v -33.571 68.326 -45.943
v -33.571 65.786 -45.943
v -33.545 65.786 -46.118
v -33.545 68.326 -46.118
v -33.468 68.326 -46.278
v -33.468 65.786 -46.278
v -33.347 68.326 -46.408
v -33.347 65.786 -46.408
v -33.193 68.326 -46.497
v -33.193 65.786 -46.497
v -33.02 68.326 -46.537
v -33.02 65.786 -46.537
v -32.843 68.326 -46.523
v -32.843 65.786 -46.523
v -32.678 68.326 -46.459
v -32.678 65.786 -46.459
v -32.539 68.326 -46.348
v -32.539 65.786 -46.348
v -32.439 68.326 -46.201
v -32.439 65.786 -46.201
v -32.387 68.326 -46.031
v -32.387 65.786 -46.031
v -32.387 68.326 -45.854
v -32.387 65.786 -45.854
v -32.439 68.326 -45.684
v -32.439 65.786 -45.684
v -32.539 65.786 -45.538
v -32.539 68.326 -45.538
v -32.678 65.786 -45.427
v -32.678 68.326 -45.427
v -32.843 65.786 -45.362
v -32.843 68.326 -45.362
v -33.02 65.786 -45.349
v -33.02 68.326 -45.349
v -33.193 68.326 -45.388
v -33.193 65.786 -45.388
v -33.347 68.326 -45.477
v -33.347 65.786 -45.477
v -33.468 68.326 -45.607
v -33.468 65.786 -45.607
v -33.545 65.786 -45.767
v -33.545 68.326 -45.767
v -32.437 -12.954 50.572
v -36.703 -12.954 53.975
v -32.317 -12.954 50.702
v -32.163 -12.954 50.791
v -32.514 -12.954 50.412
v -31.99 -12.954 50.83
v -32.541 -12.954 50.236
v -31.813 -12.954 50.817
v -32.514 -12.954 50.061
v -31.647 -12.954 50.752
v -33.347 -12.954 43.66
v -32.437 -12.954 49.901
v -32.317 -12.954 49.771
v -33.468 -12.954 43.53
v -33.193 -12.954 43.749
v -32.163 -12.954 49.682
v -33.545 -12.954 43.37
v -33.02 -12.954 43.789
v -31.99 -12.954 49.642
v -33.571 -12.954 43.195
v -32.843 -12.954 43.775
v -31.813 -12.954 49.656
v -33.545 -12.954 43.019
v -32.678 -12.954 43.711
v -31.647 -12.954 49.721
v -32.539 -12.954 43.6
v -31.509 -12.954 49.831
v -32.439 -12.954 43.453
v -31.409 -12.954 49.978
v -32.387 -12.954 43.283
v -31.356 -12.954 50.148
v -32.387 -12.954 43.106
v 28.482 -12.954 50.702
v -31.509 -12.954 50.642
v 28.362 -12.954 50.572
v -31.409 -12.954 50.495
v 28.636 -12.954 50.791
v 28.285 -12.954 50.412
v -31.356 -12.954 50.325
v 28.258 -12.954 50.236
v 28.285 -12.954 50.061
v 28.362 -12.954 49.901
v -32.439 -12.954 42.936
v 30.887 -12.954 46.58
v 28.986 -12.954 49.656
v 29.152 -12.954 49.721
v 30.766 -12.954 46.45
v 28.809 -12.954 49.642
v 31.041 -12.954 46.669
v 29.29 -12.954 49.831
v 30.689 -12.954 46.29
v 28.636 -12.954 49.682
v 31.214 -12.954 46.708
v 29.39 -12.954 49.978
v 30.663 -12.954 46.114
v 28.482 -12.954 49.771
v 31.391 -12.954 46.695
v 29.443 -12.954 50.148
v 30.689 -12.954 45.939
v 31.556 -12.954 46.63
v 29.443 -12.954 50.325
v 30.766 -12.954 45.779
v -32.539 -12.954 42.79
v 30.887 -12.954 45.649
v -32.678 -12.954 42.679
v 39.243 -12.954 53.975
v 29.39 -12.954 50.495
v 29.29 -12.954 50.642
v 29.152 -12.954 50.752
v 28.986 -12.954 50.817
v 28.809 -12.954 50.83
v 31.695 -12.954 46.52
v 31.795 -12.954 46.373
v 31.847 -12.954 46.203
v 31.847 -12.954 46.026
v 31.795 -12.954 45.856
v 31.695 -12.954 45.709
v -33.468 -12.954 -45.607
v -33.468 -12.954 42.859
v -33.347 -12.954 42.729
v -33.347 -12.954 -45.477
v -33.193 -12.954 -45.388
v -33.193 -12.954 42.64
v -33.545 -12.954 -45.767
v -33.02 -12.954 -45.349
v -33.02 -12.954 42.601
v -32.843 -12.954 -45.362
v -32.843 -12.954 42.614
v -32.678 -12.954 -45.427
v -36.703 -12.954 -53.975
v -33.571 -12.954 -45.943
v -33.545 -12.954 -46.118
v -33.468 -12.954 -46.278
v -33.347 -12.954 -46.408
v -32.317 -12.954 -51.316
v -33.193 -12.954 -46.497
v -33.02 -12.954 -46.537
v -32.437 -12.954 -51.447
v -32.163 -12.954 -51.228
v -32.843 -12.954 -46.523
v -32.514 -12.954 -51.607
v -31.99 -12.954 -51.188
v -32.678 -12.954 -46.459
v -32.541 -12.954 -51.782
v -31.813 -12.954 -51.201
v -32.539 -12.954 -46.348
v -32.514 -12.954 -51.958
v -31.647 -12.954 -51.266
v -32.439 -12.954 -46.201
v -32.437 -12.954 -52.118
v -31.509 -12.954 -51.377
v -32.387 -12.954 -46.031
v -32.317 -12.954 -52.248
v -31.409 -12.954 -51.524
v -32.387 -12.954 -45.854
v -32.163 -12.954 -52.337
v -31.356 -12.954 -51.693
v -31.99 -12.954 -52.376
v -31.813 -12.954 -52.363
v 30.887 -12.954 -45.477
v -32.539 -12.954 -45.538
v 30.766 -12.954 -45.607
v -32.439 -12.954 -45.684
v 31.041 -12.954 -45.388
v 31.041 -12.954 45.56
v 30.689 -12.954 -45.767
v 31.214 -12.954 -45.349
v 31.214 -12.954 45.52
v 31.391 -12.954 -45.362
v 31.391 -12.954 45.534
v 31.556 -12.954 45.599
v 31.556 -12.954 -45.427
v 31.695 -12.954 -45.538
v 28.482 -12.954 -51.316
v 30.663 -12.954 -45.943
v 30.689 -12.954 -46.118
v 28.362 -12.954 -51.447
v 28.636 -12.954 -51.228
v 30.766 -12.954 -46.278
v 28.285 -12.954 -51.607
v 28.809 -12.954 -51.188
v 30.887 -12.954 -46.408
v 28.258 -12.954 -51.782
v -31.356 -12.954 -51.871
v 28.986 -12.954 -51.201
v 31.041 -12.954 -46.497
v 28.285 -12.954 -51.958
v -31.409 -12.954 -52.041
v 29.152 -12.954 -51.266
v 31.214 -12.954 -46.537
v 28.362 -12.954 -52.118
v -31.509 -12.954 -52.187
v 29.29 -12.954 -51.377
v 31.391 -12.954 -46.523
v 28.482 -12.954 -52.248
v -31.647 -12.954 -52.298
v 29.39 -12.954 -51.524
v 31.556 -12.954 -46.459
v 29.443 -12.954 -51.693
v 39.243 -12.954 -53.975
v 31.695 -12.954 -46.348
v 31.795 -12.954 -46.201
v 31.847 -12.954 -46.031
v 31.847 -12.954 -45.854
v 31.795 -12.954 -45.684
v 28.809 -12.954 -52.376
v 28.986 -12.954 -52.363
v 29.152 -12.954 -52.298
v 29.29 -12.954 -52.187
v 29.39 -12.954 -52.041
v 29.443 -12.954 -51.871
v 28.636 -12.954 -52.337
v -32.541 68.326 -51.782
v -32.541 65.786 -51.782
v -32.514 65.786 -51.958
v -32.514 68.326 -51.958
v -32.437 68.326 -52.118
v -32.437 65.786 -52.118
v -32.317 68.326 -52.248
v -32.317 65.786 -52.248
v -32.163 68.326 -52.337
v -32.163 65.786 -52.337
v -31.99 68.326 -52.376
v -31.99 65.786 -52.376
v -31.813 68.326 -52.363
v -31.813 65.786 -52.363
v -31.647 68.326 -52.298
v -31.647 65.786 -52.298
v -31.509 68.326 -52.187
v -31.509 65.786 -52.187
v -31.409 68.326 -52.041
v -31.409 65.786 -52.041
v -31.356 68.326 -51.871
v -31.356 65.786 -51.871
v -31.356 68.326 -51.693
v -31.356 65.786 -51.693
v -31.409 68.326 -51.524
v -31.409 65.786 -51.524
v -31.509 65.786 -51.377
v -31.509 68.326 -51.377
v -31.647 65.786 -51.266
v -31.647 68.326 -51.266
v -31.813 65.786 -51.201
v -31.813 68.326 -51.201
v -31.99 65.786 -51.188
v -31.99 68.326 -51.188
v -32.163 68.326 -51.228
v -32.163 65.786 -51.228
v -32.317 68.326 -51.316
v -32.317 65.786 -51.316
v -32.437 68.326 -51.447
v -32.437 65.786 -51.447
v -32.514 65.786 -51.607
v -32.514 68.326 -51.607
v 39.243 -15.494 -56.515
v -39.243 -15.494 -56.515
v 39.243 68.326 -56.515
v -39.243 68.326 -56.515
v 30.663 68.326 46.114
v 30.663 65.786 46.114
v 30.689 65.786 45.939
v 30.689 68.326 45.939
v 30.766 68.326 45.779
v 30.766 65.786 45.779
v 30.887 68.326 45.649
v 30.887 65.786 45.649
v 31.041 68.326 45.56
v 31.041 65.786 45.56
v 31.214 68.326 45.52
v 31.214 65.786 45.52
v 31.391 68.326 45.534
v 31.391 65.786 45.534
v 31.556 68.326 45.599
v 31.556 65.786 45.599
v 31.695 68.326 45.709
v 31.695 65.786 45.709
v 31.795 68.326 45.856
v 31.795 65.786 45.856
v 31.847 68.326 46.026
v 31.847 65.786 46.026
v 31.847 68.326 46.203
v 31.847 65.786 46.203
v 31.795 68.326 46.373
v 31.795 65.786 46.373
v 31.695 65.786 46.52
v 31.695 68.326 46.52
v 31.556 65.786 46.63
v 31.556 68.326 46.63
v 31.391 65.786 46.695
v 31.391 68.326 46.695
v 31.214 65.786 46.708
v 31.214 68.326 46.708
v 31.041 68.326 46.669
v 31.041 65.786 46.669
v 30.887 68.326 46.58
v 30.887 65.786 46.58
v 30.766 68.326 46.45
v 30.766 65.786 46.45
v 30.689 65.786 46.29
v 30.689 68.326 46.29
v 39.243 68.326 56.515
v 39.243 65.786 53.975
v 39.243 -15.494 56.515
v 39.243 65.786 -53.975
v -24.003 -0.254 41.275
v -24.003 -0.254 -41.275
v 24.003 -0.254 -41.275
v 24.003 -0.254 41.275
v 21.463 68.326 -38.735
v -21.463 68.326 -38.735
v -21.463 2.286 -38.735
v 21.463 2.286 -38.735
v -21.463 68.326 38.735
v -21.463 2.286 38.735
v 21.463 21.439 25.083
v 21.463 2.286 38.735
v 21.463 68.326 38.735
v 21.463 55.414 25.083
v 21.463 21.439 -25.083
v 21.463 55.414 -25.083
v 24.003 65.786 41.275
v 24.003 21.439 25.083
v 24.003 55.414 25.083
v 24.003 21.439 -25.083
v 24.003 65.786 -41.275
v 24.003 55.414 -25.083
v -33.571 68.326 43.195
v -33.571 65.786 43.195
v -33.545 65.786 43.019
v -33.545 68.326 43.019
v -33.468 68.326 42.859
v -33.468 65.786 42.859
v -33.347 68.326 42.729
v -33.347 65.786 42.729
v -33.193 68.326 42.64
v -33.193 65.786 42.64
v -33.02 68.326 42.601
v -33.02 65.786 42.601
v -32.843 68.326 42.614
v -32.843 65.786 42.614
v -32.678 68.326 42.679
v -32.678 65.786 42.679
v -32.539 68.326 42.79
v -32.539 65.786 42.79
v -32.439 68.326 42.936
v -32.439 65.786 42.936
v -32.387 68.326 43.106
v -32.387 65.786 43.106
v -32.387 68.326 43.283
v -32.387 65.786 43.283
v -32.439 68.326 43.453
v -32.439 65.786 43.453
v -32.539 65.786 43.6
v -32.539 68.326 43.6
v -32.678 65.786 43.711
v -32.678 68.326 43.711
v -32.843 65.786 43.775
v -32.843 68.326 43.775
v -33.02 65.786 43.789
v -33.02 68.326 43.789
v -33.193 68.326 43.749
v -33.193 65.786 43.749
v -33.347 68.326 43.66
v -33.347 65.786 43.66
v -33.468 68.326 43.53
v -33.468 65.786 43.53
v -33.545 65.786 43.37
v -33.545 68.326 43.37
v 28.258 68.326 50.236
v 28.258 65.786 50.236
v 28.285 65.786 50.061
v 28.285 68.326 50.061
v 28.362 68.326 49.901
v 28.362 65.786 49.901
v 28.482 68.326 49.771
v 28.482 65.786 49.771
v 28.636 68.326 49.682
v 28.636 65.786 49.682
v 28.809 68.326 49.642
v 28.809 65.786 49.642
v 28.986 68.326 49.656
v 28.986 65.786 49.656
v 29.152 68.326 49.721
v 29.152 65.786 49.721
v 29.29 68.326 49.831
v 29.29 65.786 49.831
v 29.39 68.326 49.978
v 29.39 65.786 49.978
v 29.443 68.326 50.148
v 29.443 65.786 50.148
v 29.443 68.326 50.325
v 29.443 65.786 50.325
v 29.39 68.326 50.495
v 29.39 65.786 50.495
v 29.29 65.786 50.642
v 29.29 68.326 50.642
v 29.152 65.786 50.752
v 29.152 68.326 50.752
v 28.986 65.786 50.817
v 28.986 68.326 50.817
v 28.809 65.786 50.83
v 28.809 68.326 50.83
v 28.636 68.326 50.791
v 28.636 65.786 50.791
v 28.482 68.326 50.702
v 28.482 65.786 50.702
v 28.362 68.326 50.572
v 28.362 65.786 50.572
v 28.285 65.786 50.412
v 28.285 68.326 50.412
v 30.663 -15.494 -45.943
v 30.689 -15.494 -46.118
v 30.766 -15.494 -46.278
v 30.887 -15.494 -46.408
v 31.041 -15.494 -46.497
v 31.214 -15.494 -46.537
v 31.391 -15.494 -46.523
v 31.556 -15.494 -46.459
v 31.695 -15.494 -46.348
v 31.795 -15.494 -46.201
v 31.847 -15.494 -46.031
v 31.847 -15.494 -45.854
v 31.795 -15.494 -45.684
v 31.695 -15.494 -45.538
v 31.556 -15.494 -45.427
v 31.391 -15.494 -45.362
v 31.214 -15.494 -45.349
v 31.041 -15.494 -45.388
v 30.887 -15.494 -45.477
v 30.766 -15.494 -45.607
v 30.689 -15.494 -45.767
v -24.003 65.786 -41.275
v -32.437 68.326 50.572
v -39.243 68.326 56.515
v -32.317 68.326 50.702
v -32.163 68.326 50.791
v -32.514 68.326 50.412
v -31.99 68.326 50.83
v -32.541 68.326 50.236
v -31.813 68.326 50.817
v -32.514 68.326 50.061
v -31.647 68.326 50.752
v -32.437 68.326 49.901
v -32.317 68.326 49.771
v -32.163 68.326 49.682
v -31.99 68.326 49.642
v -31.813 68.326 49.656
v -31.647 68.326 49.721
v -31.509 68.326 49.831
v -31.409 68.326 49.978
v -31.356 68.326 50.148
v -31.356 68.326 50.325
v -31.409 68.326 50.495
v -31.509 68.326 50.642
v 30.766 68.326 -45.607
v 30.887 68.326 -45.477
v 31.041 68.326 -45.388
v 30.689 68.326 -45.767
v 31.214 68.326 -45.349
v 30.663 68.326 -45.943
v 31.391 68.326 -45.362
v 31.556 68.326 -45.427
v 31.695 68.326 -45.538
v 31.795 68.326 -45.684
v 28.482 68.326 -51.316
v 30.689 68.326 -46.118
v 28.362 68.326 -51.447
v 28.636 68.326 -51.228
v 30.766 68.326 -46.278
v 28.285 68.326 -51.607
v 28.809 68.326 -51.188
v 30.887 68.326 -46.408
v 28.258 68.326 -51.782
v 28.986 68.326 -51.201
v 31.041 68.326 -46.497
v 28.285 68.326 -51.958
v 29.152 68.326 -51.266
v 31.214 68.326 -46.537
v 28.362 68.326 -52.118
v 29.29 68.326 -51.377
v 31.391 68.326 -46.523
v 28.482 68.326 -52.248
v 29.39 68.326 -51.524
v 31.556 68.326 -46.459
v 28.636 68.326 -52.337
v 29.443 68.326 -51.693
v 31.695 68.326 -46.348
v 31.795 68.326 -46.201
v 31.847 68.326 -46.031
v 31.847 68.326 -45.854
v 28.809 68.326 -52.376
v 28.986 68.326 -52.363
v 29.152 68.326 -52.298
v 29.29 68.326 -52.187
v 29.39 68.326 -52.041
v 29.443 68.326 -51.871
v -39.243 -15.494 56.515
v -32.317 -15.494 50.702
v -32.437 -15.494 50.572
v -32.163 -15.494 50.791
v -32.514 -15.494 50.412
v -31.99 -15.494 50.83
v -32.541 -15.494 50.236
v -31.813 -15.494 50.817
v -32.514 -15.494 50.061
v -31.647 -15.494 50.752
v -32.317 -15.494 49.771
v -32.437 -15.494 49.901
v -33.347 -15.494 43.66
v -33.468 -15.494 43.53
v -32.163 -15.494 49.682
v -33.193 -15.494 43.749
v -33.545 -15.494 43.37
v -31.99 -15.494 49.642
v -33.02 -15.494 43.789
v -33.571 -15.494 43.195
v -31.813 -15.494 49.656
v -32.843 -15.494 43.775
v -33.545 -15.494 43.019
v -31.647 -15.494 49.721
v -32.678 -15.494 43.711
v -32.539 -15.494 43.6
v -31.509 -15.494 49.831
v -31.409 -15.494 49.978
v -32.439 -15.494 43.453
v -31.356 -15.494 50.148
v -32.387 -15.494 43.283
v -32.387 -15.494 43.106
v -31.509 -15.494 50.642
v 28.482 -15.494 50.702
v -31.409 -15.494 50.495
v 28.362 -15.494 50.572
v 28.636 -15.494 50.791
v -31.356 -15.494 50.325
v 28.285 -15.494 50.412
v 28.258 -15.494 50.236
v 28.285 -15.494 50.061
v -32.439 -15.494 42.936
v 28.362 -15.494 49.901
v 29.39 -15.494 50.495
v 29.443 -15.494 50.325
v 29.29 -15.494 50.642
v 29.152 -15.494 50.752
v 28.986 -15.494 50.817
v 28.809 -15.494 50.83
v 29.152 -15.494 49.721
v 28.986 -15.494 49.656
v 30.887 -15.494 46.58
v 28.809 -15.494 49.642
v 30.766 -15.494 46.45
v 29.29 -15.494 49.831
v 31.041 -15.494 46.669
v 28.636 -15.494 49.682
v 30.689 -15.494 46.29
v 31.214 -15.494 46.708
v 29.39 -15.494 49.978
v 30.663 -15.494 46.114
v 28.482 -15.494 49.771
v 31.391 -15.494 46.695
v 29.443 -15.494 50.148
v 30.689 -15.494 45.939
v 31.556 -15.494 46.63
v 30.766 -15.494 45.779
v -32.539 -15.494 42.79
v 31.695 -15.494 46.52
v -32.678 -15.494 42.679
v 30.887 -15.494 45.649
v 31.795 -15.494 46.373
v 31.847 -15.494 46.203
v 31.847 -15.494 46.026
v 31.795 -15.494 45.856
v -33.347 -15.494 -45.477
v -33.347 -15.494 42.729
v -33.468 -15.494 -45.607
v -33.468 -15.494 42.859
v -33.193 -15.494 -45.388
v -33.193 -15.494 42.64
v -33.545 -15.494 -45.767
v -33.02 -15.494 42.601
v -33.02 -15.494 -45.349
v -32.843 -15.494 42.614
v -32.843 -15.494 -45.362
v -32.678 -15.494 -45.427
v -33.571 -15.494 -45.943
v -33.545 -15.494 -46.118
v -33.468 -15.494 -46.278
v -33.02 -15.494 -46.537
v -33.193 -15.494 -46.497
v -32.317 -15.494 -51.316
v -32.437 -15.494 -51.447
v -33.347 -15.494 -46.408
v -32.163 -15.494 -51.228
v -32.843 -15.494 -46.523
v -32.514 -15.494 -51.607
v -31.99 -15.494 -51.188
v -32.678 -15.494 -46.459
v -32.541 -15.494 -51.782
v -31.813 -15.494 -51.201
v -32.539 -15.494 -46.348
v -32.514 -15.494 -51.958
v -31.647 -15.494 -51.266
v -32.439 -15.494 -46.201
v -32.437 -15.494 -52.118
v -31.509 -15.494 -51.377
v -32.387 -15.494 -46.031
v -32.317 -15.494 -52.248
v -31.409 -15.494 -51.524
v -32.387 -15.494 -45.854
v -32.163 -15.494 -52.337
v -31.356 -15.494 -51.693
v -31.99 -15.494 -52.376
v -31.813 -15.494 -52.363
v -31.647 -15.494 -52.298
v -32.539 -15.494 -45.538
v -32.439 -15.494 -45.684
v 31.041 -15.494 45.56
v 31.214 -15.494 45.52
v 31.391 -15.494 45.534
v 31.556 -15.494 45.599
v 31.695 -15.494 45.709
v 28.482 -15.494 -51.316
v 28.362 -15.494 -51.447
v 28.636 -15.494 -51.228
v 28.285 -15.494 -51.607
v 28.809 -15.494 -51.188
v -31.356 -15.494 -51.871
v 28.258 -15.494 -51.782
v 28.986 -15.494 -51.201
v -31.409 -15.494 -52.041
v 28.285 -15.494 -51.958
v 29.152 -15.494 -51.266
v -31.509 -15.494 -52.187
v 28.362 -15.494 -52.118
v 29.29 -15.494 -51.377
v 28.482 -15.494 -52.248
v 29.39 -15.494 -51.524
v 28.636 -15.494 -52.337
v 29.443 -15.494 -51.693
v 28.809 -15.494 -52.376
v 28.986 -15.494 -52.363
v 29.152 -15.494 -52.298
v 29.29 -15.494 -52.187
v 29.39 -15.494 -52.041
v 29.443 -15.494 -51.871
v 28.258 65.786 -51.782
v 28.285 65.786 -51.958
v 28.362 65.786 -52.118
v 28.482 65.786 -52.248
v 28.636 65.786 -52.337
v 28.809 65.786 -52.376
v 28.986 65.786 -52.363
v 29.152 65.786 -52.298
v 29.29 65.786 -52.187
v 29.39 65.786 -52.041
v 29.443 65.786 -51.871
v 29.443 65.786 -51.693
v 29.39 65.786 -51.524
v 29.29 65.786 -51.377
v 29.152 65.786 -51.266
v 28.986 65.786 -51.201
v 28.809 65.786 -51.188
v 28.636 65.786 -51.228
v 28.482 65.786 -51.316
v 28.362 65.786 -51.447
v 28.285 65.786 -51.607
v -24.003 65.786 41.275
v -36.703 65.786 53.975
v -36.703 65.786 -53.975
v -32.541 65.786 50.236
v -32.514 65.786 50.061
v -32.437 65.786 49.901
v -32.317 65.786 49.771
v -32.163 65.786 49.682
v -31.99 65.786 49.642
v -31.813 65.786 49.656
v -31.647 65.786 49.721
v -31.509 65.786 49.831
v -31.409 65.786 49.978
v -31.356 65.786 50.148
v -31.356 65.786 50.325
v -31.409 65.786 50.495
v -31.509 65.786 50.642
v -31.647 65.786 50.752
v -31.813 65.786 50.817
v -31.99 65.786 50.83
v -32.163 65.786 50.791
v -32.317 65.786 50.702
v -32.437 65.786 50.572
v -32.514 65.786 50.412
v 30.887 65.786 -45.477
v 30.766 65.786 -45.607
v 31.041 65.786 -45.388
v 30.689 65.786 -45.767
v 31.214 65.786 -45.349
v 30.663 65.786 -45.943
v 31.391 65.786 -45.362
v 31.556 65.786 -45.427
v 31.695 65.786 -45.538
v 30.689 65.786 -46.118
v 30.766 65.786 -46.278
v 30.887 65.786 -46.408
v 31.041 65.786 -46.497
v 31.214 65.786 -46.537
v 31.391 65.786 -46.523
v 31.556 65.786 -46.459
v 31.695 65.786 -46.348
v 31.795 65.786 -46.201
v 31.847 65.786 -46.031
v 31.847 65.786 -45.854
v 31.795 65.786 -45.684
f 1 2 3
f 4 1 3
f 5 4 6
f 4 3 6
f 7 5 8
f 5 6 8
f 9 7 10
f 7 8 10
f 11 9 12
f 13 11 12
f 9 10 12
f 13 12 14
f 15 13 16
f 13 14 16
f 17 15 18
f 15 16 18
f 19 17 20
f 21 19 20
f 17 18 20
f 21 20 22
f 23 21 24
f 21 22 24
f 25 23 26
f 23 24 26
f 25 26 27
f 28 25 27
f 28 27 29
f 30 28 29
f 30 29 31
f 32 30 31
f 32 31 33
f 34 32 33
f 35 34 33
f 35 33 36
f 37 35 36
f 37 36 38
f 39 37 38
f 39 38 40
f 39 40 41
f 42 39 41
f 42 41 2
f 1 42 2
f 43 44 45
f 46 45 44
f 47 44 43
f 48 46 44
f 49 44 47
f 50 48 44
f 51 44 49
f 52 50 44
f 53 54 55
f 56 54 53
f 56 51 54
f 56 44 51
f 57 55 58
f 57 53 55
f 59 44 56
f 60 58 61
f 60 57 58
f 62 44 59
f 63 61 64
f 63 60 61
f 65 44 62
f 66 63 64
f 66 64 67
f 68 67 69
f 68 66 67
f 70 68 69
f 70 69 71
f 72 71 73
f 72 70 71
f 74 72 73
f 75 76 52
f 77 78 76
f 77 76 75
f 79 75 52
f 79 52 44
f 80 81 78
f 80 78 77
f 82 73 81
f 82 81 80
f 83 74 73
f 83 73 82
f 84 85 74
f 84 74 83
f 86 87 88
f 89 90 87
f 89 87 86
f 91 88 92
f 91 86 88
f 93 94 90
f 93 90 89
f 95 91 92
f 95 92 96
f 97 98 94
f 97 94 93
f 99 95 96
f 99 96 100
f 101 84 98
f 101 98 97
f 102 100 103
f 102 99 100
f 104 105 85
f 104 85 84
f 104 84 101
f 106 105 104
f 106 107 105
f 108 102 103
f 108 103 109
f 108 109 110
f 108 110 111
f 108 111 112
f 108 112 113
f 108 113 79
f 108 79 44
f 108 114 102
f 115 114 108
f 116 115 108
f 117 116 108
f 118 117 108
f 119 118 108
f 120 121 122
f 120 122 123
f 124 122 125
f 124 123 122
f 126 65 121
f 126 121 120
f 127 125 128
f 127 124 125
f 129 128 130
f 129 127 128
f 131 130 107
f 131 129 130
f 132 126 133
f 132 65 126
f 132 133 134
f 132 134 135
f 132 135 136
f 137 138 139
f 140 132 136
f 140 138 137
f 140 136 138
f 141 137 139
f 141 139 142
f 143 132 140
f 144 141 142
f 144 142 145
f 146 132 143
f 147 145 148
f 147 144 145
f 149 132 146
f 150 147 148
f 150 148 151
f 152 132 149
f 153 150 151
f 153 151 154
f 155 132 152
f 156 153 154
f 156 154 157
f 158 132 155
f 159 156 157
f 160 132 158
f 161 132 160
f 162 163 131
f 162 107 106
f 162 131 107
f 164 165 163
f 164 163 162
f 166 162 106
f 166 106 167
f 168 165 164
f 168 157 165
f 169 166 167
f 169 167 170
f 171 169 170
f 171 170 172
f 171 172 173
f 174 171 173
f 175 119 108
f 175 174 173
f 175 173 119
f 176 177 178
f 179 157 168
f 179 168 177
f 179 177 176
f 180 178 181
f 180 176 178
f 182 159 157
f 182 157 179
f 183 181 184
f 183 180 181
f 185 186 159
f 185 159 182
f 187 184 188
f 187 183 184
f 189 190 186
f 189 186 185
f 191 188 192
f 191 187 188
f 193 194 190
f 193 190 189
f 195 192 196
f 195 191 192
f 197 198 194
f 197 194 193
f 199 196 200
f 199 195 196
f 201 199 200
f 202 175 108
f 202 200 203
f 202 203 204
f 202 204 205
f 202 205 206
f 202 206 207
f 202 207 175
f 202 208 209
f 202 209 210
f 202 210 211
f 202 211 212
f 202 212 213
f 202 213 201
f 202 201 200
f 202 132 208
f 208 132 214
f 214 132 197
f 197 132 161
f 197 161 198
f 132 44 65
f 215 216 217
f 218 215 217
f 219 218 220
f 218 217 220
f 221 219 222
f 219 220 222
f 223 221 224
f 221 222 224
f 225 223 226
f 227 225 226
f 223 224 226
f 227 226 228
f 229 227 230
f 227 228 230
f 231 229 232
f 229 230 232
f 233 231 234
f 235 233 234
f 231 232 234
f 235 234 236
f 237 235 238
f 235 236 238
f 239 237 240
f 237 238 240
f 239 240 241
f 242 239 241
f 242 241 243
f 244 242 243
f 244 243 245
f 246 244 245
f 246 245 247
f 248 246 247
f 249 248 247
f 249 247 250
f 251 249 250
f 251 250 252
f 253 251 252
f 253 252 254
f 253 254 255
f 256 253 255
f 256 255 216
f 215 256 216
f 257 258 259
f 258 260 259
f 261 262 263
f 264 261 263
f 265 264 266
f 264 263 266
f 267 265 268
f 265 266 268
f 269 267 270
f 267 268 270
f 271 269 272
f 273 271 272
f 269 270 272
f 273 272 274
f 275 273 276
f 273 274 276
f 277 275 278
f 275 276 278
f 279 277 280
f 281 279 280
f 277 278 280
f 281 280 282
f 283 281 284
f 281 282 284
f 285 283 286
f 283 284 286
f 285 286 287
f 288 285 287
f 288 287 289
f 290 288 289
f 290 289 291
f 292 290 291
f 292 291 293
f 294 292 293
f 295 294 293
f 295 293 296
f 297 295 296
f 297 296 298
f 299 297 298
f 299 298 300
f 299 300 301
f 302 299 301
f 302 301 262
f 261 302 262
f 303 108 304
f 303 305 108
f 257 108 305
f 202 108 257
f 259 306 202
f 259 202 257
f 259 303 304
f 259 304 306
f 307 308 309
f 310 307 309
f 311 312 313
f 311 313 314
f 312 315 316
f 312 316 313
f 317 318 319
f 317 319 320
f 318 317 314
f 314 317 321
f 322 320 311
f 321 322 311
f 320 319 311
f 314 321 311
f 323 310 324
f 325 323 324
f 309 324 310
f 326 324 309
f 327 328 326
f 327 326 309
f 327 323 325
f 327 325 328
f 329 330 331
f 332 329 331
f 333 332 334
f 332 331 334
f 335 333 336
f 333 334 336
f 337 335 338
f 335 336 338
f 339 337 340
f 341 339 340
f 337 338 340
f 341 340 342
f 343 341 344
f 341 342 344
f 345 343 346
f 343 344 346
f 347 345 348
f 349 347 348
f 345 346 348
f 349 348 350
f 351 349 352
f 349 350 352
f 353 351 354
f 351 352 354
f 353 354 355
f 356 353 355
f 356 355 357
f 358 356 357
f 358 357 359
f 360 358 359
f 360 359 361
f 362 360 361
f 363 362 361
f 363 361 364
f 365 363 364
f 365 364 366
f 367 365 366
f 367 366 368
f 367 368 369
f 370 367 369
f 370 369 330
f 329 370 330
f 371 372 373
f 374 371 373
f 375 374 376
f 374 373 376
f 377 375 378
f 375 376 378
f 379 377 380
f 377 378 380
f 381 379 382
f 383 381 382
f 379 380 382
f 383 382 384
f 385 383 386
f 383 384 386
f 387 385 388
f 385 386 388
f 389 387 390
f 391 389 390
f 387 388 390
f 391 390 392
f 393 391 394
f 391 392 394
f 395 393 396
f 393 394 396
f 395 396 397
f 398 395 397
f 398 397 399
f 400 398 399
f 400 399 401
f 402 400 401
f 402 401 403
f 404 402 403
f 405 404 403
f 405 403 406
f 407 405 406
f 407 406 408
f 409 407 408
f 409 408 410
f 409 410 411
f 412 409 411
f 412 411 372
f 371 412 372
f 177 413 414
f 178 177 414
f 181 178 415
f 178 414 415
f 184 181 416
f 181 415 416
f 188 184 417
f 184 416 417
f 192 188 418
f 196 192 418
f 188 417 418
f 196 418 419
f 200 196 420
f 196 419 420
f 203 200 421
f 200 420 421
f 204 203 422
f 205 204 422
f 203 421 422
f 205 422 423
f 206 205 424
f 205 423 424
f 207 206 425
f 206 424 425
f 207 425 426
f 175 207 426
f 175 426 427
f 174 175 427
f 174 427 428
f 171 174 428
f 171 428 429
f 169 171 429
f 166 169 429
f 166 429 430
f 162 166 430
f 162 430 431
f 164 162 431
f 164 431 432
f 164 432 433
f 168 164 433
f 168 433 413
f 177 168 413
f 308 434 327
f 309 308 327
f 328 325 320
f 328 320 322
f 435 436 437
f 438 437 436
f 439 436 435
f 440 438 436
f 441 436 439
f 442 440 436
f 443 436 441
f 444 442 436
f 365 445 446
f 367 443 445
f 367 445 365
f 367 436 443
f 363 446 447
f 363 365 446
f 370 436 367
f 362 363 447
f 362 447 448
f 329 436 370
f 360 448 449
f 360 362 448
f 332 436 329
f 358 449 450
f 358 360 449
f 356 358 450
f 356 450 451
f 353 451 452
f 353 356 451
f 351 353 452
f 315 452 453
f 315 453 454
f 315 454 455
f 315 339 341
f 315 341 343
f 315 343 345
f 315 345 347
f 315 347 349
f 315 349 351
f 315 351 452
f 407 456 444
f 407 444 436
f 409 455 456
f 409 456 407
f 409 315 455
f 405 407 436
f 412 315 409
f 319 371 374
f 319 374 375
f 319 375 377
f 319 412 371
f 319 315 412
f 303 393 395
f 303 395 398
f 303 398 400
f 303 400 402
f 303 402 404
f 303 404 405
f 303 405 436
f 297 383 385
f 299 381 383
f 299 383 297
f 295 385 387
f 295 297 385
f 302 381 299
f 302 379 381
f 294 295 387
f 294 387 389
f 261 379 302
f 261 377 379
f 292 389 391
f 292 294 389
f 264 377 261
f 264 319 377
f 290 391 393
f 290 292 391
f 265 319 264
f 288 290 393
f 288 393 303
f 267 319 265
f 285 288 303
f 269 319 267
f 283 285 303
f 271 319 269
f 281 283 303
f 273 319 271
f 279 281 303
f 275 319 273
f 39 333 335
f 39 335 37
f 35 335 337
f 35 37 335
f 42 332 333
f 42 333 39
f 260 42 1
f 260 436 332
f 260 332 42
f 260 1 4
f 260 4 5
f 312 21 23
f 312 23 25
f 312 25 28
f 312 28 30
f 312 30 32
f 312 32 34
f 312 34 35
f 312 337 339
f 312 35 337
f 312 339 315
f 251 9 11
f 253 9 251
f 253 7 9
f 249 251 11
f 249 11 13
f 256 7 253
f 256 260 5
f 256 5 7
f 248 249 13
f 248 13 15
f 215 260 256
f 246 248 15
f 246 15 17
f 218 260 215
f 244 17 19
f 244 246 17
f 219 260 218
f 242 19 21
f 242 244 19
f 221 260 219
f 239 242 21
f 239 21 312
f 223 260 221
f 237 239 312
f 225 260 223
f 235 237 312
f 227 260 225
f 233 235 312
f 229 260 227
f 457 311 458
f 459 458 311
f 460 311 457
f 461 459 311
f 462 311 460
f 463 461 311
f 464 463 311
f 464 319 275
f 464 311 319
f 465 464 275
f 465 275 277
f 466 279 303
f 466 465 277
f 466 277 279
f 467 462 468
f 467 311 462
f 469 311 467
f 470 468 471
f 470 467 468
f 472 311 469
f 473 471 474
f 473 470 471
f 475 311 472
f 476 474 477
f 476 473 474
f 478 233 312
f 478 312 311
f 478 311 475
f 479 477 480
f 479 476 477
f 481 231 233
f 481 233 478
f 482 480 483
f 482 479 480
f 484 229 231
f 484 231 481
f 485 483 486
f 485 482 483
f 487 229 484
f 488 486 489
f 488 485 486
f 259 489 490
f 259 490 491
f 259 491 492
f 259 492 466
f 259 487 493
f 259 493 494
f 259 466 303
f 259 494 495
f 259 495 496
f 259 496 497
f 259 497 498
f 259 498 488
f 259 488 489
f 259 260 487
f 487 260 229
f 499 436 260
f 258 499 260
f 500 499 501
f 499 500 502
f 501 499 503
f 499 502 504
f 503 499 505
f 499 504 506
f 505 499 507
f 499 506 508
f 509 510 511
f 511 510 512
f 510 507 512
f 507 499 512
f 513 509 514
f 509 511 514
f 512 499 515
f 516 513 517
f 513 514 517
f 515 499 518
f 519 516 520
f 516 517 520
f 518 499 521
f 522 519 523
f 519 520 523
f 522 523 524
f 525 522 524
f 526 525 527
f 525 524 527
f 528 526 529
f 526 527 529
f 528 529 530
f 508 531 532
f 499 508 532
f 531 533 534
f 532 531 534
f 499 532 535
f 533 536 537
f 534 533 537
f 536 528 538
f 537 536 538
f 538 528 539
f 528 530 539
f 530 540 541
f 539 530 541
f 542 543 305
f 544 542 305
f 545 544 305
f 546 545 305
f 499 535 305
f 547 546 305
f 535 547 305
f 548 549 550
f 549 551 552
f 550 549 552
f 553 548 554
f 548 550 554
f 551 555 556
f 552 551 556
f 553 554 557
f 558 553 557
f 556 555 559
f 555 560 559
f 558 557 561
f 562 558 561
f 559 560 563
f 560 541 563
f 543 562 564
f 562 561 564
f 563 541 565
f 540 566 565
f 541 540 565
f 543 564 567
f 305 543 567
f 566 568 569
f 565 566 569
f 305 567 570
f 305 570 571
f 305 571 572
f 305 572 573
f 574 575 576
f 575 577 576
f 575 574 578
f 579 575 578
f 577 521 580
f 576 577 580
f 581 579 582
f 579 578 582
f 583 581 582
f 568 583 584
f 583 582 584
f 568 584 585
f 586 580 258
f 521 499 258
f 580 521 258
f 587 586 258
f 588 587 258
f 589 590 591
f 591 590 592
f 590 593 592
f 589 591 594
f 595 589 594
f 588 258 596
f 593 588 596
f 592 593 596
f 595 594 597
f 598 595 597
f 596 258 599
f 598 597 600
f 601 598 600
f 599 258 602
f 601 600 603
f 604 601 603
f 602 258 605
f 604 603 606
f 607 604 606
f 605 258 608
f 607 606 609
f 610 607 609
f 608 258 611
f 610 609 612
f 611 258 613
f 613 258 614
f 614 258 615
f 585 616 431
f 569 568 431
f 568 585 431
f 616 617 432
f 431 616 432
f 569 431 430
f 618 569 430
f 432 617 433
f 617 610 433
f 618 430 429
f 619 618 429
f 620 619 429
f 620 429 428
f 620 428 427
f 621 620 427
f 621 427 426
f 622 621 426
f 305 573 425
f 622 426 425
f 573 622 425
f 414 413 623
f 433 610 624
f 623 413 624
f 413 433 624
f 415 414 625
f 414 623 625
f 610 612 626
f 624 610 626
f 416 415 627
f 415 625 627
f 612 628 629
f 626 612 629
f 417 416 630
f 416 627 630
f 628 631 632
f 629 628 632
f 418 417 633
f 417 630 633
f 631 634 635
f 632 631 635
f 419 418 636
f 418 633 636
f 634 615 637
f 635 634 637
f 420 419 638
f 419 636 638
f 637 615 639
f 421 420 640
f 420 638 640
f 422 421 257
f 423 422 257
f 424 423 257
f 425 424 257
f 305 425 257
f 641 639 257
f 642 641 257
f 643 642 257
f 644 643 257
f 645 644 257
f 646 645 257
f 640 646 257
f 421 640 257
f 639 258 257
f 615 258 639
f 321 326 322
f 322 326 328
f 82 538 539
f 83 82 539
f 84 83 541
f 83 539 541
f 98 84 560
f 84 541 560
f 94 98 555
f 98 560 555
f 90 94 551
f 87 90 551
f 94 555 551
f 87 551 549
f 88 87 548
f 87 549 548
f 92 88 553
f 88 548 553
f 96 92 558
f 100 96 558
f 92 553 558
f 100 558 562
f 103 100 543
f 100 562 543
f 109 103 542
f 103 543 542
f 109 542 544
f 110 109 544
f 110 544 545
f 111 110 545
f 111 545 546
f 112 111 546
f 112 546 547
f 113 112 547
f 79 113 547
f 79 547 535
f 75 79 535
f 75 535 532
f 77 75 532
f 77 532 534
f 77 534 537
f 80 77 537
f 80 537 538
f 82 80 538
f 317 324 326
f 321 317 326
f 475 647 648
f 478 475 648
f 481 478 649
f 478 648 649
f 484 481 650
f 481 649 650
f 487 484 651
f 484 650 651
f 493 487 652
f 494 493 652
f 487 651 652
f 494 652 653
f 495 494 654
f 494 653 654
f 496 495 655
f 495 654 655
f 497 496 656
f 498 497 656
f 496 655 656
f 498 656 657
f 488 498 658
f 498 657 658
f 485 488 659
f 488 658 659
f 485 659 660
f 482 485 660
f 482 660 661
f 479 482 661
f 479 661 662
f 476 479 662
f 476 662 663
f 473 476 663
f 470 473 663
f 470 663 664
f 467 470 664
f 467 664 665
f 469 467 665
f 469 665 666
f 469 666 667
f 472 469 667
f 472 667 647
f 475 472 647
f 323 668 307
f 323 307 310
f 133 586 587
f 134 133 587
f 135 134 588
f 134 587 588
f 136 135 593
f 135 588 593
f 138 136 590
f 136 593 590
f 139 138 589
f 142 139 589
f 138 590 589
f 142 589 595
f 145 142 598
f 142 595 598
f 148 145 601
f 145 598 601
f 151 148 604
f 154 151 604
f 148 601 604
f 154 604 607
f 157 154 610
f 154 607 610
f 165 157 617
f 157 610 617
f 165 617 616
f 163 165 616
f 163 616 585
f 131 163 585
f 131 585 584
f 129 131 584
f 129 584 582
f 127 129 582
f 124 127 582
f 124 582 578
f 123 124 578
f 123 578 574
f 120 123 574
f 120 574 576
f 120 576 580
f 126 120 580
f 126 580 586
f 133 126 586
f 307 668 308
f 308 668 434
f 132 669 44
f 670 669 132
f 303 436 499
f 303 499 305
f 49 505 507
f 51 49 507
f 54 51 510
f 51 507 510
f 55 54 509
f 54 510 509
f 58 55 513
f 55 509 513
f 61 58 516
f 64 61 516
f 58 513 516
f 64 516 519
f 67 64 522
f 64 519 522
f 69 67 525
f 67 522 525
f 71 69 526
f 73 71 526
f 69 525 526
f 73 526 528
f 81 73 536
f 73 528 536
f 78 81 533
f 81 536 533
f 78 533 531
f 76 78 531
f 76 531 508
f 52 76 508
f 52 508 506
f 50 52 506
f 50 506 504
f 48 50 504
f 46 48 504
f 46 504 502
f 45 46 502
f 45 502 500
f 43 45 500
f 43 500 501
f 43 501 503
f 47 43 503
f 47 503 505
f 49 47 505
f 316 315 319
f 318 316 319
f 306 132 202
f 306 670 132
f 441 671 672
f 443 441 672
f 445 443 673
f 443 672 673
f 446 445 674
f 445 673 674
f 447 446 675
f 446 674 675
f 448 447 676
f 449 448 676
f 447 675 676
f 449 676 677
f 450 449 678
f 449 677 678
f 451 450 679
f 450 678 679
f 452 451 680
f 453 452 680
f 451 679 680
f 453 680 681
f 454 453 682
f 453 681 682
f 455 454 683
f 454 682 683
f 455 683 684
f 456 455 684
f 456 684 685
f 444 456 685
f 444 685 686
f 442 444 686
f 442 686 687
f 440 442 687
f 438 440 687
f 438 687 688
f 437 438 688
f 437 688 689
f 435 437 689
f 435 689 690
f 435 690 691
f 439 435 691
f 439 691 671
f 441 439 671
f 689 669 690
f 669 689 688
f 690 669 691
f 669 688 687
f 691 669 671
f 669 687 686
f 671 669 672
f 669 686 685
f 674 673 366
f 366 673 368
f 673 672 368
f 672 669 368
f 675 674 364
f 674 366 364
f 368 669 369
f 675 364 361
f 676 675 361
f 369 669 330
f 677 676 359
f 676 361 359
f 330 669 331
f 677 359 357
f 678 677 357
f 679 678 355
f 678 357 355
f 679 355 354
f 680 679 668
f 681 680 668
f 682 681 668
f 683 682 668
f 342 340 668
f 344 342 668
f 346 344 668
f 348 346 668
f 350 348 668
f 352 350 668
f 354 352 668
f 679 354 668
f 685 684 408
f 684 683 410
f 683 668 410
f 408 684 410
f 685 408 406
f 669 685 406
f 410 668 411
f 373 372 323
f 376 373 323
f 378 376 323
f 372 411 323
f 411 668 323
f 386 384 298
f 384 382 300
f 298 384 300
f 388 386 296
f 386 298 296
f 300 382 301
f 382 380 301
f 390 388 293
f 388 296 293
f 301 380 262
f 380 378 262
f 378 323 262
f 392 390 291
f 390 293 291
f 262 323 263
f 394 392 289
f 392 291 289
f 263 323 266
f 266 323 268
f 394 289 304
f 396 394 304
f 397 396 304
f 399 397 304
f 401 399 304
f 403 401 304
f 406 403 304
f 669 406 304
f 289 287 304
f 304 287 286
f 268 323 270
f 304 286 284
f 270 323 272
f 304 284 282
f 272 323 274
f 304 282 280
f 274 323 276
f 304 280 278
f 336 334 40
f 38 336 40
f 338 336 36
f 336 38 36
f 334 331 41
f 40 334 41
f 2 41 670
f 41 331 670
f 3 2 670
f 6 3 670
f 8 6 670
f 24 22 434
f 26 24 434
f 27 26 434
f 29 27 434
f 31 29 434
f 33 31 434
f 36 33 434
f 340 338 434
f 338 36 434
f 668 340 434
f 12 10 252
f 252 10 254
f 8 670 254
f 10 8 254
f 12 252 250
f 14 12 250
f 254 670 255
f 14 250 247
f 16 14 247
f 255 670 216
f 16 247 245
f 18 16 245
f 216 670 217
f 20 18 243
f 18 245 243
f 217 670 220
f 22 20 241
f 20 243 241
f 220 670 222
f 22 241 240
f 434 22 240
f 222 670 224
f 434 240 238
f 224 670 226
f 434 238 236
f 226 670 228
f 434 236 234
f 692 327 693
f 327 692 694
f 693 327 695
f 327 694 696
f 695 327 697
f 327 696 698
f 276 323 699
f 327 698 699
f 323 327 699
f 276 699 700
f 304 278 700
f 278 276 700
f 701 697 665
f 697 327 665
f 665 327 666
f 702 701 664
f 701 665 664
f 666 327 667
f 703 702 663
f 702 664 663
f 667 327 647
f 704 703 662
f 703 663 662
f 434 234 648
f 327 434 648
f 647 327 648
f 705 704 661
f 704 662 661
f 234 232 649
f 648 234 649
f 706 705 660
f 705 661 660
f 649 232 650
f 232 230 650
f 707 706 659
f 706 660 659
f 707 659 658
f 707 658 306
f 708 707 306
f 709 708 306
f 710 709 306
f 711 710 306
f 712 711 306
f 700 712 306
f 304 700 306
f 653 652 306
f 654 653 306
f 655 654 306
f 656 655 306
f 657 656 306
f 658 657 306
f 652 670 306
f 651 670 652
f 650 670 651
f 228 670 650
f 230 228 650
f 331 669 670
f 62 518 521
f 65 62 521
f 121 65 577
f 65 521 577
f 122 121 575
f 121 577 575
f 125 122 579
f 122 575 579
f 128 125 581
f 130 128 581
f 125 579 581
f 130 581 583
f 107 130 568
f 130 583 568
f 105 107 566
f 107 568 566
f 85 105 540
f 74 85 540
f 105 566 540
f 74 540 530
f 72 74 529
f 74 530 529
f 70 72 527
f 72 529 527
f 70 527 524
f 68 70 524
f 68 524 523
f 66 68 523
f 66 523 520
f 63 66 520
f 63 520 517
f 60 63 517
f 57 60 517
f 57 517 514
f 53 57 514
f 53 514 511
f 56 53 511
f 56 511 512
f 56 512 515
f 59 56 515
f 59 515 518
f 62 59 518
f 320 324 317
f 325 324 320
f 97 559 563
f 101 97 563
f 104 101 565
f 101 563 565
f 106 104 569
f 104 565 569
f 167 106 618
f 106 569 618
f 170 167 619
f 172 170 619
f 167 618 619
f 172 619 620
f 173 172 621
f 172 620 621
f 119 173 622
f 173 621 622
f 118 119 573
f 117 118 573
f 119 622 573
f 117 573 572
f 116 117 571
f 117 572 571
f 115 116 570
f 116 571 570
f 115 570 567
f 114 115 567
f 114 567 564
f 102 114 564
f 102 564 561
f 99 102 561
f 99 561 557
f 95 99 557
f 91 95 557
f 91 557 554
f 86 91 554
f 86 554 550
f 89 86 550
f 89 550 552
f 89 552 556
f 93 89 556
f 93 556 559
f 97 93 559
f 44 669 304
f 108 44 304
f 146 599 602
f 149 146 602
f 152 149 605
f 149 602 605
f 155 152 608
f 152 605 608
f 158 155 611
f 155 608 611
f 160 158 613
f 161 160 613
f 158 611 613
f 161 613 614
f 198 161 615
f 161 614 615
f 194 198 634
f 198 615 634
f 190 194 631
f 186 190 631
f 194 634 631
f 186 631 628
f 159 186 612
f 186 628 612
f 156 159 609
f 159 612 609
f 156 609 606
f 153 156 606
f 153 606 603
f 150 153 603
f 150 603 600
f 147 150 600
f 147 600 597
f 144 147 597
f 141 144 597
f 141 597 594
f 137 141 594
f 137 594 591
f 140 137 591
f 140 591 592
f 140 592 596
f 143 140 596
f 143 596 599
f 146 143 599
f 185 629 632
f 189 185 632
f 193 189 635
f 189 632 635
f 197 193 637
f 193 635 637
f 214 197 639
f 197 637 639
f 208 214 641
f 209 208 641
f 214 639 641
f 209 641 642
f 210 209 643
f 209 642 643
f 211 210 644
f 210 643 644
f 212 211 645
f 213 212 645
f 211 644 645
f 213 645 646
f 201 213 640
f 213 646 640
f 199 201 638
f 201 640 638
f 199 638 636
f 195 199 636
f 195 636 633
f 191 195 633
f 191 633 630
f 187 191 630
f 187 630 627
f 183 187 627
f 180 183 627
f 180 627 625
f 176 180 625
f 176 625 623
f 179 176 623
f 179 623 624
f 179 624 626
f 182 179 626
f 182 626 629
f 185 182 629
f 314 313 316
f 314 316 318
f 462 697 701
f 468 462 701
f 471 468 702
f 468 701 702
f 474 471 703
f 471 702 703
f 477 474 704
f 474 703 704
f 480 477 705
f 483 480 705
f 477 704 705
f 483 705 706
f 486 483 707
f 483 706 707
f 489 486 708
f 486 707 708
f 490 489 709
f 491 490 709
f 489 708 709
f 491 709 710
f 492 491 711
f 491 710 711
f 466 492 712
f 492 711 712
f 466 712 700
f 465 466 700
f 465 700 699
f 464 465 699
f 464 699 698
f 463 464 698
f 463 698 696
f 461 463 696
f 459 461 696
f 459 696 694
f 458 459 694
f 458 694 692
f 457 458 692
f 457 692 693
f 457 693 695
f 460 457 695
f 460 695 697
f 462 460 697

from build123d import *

# Parameters (mm, degrees)
SKETCH1_W                = 78.486
SKETCH1_H                = 113.03
BOSS_EXTRUDE1_DEPTH      = 68.326
BOSS_EXTRUDE1_DEPTH_BACK = 15.494
SHELL1_T                 = -17.78
SHELL5_T                 = -2.54
SKETCH2_W                = 50.166140906
SKETCH2_H                = 33.974952571
CUT_EXTRUDE1_DEPTH       = 12.446
F_0_80_TAPPED_HOLE1_D    = 1.19126


with BuildPart() as part:
    # Sketch1 → Boss-Extrude1 (new body, two sides)
    with BuildSketch(Plane(origin=(0, 0, 0), x_dir=(1, 0, 0), z_dir=(0, 1, 0))) as boss_extrude1_sk:
        Rectangle(SKETCH1_W, SKETCH1_H)
    extrude(amount=BOSS_EXTRUDE1_DEPTH)
    extrude(boss_extrude1_sk.sketch, amount=-BOSS_EXTRUDE1_DEPTH_BACK)

    # Shell1
    shell1_openings = [part.faces().sort_by_distance(p)[0] for p in [
        (0, 68.326, 0),
    ]]
    offset(amount=SHELL1_T, openings=shell1_openings, kind=Kind.INTERSECTION)

    # Shell5
    shell5_openings = [part.faces().sort_by_distance(p)[0] for p in [
        (39.243, 26.416, 0),
    ]]
    offset(amount=SHELL5_T, openings=shell5_openings, kind=Kind.INTERSECTION)

    # Sketch2 → Cut-Extrude1 (cut)
    with BuildSketch(Plane(origin=(24.003, 0, 0), x_dir=(0, 0, -1), z_dir=(1, 0, 0))):
        with Locations((0, 38.426676593)):
            Rectangle(SKETCH2_W, SKETCH2_H)
    extrude(amount=-CUT_EXTRUDE1_DEPTH, mode=Mode.SUBTRACT)

    # #0-80 Tapped Hole1 (through all)
    with Locations(Plane(origin=(0, 68.326, 0), x_dir=(1, 0, 0), z_dir=(0, 1, 0))):
        with Locations((-31.94519897, 51.782137041), (-32.97568926, 45.942692068), (28.853728102, 51.782137041), (31.258205444, 45.942692068), (31.258205444, -46.114440449), (28.853728102, -50.236401607), (-31.94519897, -50.236401607), (-32.97568926, -43.194717963)):
            Hole(F_0_80_TAPPED_HOLE1_D / 2)


solid = part.part
